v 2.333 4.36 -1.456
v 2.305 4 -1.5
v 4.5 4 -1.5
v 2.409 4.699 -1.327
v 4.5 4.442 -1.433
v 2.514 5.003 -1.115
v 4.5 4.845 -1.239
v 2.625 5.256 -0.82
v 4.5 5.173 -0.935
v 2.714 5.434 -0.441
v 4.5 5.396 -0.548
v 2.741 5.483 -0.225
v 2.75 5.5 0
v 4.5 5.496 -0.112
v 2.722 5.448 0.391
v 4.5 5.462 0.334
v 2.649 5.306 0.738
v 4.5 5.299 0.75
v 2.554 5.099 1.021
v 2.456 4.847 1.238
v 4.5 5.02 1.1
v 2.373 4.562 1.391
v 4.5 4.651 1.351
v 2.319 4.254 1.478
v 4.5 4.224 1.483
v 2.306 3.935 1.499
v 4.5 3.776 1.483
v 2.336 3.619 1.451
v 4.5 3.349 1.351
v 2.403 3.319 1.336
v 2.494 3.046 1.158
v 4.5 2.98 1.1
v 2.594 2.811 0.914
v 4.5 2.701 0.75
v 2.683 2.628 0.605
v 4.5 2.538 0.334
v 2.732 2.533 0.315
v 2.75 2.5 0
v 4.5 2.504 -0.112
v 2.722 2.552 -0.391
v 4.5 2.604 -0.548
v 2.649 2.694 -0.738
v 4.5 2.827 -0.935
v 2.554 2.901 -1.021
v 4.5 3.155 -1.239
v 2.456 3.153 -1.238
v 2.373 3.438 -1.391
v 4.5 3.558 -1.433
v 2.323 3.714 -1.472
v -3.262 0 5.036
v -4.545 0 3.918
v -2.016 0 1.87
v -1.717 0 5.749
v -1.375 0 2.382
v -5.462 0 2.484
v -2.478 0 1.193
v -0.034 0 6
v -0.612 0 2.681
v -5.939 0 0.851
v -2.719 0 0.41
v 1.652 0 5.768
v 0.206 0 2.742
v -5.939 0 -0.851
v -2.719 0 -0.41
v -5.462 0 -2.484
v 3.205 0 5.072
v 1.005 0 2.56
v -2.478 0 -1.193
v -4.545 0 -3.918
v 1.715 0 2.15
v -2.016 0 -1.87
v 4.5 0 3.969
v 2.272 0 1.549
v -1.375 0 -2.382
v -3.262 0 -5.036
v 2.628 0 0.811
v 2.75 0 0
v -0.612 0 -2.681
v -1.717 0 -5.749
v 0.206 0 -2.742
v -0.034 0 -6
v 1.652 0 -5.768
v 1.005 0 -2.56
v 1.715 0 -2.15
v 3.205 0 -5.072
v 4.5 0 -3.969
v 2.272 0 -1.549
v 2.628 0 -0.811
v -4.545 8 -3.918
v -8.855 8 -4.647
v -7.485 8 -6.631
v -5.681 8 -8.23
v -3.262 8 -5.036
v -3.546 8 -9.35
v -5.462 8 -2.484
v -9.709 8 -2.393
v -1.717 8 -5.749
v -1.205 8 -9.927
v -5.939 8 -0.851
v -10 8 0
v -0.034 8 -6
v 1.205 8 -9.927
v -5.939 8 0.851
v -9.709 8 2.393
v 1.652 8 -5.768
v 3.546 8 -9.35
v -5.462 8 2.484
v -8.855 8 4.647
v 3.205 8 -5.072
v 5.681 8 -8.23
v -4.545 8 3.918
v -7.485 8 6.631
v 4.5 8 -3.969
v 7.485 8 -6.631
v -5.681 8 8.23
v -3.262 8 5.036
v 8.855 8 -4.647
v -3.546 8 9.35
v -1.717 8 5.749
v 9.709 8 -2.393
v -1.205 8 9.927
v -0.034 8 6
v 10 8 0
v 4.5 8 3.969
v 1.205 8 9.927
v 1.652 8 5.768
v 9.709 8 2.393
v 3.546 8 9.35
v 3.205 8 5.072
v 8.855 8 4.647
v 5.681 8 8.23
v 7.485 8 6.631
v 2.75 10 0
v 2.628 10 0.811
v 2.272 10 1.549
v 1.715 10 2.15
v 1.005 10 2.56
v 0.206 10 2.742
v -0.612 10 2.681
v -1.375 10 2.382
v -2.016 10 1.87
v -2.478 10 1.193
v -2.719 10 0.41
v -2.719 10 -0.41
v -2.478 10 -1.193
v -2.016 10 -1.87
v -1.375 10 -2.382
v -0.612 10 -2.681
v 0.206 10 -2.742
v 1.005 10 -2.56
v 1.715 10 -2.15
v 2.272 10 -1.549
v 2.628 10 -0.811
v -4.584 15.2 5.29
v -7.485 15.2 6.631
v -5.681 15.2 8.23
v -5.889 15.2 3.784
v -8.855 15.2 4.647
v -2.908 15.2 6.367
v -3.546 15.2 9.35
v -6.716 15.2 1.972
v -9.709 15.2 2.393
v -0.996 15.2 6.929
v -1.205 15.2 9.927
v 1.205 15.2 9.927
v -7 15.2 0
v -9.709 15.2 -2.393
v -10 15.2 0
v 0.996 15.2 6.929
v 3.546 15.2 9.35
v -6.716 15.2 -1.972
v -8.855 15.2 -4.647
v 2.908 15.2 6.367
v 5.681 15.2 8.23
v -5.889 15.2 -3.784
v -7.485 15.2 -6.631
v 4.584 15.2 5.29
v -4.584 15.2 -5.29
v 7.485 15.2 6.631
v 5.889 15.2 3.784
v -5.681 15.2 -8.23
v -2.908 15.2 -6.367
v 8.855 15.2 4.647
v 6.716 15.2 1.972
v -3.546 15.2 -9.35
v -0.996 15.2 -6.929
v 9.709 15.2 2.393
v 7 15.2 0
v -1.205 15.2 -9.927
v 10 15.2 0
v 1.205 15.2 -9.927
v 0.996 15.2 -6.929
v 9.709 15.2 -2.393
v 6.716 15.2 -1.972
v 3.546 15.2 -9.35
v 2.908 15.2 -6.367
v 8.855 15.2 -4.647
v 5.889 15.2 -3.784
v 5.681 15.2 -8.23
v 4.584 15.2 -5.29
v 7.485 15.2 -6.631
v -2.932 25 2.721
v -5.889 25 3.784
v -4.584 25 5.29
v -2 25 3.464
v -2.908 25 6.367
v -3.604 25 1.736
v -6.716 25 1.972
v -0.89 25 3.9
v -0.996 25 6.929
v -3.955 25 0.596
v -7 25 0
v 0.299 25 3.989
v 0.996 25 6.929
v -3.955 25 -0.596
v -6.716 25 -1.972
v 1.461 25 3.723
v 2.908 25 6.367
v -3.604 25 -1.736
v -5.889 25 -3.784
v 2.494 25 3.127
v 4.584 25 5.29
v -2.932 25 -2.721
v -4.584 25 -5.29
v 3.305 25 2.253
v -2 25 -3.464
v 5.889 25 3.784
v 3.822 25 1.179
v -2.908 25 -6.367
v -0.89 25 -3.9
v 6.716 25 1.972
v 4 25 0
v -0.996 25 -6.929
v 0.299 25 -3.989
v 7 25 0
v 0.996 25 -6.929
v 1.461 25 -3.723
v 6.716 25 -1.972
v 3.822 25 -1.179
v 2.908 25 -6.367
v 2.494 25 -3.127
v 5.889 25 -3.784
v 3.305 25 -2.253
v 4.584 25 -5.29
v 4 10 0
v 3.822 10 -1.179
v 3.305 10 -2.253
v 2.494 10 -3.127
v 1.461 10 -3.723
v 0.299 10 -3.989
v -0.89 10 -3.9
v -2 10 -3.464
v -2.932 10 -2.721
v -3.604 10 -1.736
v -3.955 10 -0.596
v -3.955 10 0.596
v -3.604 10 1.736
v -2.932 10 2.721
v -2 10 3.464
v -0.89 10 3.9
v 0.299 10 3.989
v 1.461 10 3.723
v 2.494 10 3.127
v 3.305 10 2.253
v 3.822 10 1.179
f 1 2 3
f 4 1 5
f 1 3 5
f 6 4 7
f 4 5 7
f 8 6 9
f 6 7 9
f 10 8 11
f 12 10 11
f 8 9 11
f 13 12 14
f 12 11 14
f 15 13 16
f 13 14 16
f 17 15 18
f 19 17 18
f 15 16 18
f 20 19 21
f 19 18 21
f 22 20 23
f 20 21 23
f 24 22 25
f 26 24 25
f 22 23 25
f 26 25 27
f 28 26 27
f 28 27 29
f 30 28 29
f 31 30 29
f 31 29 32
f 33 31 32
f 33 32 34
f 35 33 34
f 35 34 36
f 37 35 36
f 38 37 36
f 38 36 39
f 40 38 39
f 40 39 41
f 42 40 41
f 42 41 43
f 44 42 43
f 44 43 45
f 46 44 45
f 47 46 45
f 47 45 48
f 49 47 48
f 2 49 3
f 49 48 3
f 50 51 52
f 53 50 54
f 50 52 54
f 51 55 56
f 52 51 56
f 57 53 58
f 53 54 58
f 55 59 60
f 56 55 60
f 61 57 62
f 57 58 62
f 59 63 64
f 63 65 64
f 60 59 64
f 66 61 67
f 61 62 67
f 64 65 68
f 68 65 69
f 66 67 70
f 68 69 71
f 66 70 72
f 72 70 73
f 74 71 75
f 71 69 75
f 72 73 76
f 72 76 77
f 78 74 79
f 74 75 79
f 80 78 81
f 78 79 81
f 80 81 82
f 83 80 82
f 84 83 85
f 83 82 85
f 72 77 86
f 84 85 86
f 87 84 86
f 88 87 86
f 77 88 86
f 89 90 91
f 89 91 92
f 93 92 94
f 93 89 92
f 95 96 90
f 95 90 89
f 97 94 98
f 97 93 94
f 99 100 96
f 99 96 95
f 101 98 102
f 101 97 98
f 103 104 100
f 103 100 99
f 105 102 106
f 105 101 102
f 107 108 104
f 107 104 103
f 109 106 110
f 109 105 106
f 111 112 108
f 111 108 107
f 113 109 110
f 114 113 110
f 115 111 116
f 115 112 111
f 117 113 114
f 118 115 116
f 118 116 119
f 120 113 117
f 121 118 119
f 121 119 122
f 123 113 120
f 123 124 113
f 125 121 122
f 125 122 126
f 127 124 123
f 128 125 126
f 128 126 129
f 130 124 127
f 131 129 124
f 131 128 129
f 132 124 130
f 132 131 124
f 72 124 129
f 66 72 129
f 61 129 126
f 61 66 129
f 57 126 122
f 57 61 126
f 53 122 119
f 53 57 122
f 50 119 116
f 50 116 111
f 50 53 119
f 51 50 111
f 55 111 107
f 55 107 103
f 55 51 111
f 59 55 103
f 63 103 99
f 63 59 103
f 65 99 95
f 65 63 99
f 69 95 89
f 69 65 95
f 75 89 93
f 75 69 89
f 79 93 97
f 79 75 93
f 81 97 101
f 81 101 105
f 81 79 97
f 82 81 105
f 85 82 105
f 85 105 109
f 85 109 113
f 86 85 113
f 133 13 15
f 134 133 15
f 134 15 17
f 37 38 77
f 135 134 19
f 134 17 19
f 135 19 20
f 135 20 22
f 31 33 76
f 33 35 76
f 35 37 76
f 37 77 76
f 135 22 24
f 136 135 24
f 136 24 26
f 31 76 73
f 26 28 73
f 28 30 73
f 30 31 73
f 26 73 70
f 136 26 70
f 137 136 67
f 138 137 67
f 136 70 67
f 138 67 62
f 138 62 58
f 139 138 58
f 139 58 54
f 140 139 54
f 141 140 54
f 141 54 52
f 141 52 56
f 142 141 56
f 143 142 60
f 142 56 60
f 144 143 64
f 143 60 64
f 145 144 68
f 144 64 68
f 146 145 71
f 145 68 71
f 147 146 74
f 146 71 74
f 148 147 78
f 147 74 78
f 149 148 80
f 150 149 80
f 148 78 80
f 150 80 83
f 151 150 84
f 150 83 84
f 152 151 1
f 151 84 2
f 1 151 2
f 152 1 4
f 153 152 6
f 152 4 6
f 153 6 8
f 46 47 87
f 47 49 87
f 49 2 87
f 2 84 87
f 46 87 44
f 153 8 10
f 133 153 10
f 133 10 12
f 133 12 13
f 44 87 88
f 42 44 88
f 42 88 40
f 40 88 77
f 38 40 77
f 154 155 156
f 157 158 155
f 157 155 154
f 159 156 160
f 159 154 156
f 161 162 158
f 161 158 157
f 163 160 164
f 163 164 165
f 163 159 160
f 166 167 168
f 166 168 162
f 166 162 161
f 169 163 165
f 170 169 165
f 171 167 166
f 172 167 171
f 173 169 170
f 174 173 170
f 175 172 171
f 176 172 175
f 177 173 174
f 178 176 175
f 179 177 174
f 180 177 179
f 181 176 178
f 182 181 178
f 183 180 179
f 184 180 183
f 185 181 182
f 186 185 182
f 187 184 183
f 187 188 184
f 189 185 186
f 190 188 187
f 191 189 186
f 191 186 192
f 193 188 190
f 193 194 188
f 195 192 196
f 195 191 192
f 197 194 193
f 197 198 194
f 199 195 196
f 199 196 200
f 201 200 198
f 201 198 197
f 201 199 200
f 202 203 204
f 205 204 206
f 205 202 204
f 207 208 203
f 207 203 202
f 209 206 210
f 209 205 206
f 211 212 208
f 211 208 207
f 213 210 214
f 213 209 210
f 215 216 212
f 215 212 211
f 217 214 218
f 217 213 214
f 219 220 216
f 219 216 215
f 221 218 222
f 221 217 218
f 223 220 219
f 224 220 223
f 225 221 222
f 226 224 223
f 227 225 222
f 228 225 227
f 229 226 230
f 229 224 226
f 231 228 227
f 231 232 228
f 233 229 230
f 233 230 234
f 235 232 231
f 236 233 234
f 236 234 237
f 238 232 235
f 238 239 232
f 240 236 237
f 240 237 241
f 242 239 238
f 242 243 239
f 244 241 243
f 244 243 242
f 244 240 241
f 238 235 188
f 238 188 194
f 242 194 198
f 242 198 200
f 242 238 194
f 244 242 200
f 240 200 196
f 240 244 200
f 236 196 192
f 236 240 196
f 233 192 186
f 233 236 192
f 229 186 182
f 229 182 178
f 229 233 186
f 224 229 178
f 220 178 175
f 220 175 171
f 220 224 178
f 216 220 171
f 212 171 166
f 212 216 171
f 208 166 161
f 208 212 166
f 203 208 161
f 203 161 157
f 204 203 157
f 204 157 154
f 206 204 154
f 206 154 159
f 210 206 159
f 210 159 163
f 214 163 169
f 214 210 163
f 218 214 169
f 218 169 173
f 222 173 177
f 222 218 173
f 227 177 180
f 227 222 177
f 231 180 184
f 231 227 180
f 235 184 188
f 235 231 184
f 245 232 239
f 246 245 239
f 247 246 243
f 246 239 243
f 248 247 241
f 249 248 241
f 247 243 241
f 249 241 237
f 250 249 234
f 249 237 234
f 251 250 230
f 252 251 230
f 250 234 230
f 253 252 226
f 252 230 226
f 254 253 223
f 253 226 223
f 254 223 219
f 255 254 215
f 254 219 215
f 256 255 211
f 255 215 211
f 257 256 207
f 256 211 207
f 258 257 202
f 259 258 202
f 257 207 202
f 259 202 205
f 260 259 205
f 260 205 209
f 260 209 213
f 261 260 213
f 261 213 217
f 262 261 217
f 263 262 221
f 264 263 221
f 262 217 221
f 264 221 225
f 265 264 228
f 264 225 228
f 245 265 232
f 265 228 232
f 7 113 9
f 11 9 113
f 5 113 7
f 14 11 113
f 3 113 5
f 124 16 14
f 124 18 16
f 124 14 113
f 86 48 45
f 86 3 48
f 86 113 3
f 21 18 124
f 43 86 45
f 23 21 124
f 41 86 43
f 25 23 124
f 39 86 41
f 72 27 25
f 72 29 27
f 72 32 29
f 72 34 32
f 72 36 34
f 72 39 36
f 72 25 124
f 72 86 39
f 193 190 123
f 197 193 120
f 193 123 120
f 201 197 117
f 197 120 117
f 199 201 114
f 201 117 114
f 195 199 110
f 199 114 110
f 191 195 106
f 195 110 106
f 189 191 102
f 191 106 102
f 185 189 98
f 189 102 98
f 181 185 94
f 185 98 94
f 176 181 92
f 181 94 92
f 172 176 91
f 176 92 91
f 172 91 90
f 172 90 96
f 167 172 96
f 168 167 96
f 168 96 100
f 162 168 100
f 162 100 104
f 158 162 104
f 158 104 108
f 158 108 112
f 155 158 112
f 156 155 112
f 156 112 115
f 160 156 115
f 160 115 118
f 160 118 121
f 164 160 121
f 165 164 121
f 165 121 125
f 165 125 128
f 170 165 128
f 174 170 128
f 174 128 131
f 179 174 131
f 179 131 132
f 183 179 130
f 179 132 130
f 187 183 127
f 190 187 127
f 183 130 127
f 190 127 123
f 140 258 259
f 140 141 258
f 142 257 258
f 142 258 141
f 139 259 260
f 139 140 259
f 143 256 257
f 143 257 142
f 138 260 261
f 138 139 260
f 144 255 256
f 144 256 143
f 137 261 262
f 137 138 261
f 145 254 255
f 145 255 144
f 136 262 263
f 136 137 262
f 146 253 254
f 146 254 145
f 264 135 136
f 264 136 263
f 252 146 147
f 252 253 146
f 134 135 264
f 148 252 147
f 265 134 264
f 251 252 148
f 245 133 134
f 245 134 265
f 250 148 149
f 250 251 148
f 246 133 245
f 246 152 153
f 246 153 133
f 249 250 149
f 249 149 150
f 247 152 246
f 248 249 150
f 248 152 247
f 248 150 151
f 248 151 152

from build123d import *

# Parameters (mm, degrees)
SKETCH1_R           = 10
BOSS_EXTRUDE2_DEPTH = 25
SKETCH2_R           = 10
SKETCH2_R_2         = 7
CUT_EXTRUDE1_DEPTH  = 9.8
SKETCH3_R           = 10
SKETCH3_R_2         = 6
CUT_EXTRUDE2_DEPTH  = 8
SKETCH4_R           = 4
CUT_EXTRUDE3_DEPTH  = 15
SKETCH5_R           = 2.75
CUT_EXTRUDE4_DEPTH  = 11
CUT_EXTRUDE5_DEPTH  = 8
SKETCH7_R           = 1.5
CUT_EXTRUDE6_DEPTH  = 4


with BuildPart() as part:
    # Sketch1 → Boss-Extrude2 (new body)
    with BuildSketch(Plane(origin=(0, 0, 0), x_dir=(1, 0, 0), z_dir=(0, 1, 0))):
        Circle(SKETCH1_R)
    extrude(amount=BOSS_EXTRUDE2_DEPTH)

    # Sketch2 → Cut-Extrude1 (cut)
    with BuildSketch(Plane(origin=(0, 25, 0), x_dir=(1, 0, 0), z_dir=(0, 1, 0))):
        Circle(SKETCH2_R)
        Circle(SKETCH2_R_2, mode=Mode.SUBTRACT)
    extrude(amount=-CUT_EXTRUDE1_DEPTH, mode=Mode.SUBTRACT)

    # Sketch3 → Cut-Extrude2 (cut)
    with BuildSketch(Plane.XZ):
        Circle(SKETCH3_R)
        Circle(SKETCH3_R_2, mode=Mode.SUBTRACT)
    extrude(amount=-CUT_EXTRUDE2_DEPTH, mode=Mode.SUBTRACT)

    # Sketch4 → Cut-Extrude3 (cut)
    with BuildSketch(Plane(origin=(0, 25, 0), x_dir=(1, 0, 0), z_dir=(0, 1, 0))):
        Circle(SKETCH4_R)
    extrude(amount=-CUT_EXTRUDE3_DEPTH, mode=Mode.SUBTRACT)

    # Sketch5 → Cut-Extrude4 (cut)
    with BuildSketch(Plane.XZ):
        Circle(SKETCH5_R)
    extrude(amount=-CUT_EXTRUDE4_DEPTH, mode=Mode.SUBTRACT)

    # Sketch6 → Cut-Extrude5 (cut)
    with BuildSketch(Plane.XZ):
        with BuildLine():
            Line((4.5, 0), (4.5, 3.968626967))
            ThreePointArc((4.5, 3.968626967), (6, 0), (4.5, -3.968626967))
            Line((4.5, -3.968626967), (4.5, 0))
        make_face()
    extrude(amount=-CUT_EXTRUDE5_DEPTH, mode=Mode.SUBTRACT)

    # Sketch7 → Cut-Extrude6 (cut)
    with BuildSketch(Plane(origin=(4.5, 0, 0), x_dir=(0, 0, -1), z_dir=(1, 0, 0))):
        with Locations((0, 4)):
            Circle(SKETCH7_R)
    extrude(amount=-CUT_EXTRUDE6_DEPTH, mode=Mode.SUBTRACT)


solid = part.part
